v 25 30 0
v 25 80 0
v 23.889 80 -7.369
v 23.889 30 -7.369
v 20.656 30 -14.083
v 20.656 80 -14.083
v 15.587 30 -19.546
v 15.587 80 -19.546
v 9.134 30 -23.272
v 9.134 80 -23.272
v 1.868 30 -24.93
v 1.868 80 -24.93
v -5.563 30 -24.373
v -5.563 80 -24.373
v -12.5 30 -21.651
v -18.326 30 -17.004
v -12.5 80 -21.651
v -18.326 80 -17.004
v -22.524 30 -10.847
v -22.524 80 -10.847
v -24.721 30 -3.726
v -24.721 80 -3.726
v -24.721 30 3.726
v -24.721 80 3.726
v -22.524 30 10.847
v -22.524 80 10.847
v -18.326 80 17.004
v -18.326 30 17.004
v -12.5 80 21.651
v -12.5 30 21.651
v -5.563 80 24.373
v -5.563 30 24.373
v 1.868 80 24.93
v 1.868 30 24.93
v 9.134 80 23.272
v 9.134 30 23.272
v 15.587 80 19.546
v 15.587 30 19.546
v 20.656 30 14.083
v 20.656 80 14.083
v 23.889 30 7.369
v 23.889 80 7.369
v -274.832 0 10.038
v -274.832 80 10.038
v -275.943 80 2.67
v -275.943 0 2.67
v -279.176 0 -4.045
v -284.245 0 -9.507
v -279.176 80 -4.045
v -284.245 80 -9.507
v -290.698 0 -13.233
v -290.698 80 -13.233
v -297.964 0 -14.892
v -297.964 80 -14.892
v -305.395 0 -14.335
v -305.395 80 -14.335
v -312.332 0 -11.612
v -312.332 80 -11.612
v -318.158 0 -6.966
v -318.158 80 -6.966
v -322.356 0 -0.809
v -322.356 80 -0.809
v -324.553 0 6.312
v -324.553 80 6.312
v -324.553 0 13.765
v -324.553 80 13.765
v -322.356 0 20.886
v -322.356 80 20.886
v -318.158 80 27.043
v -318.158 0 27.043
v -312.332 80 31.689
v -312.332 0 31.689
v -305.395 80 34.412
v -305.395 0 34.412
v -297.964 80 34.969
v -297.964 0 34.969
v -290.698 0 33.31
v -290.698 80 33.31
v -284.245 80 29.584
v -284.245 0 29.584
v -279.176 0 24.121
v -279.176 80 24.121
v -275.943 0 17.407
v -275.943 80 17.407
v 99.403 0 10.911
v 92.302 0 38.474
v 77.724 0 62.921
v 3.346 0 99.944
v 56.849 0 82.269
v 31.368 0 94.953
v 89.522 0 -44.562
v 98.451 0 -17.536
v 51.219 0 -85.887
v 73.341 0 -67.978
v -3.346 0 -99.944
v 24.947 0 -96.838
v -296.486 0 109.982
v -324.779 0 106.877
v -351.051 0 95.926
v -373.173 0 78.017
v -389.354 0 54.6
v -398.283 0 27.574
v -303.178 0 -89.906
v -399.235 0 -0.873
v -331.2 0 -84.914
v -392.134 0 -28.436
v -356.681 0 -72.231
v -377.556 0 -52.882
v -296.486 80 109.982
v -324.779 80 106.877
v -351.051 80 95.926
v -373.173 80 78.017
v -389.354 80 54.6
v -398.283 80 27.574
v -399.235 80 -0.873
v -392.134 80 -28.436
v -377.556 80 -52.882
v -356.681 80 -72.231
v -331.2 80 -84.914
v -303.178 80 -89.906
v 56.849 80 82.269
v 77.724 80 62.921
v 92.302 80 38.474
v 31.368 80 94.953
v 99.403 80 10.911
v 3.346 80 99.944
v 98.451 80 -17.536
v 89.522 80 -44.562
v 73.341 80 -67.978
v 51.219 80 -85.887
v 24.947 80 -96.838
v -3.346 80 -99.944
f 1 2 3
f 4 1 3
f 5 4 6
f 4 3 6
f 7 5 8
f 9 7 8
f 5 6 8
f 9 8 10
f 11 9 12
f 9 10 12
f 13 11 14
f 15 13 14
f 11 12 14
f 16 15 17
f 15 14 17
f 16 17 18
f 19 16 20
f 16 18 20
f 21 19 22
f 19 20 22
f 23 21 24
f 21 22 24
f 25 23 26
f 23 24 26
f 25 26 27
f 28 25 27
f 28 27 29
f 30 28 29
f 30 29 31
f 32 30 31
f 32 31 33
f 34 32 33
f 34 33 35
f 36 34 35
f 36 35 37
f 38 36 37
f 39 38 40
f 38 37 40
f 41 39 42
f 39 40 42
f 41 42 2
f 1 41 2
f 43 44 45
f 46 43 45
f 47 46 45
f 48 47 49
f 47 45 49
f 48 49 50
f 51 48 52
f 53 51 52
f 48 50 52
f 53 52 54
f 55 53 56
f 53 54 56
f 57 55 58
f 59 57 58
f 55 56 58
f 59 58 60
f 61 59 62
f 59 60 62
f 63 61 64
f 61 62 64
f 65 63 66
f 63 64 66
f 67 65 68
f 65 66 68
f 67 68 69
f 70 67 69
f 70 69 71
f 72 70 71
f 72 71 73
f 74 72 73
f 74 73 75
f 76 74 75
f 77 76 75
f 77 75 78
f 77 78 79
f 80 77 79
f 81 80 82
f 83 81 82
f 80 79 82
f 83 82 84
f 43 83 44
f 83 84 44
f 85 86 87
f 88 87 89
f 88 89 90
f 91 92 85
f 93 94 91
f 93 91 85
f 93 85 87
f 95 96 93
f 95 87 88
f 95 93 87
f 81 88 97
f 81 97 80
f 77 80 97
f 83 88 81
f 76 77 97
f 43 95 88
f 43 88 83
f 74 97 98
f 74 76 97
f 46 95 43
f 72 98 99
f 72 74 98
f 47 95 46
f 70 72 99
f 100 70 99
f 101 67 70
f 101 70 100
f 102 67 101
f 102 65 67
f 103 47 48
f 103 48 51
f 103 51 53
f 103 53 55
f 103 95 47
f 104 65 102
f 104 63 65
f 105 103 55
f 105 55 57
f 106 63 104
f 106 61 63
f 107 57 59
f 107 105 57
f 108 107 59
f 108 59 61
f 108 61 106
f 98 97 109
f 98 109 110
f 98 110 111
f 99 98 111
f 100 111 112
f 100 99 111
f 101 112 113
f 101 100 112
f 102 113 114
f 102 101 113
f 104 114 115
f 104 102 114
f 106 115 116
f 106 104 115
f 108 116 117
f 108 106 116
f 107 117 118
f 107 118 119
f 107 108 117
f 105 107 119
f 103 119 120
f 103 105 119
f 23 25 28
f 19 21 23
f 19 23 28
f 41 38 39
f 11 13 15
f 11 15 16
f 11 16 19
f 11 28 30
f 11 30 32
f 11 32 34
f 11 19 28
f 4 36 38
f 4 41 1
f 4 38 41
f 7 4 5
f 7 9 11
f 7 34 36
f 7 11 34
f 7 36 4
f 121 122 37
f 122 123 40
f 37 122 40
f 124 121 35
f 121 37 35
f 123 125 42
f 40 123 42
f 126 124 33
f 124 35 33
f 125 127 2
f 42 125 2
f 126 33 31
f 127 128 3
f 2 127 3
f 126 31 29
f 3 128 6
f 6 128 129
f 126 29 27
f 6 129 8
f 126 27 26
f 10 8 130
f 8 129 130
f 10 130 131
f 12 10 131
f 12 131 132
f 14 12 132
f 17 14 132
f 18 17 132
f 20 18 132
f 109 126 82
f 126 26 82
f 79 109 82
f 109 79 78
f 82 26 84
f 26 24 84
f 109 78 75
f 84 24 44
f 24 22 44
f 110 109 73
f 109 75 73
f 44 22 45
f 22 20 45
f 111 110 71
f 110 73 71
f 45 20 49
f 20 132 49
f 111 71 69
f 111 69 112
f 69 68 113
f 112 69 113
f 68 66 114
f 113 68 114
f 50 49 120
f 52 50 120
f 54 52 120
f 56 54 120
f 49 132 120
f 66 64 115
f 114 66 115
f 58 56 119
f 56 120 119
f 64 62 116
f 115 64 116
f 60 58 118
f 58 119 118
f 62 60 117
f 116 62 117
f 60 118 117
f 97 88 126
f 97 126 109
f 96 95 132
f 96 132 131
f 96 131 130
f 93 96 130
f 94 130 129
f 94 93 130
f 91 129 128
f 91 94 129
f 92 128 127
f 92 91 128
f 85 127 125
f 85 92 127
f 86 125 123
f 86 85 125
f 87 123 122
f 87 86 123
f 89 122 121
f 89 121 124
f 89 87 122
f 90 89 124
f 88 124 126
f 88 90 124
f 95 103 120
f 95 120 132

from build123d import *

# Parameters (mm, degrees)
BOSS_EXTRUDE1_DEPTH = 80
SKETCH2_R           = 25
CUT_EXTRUDE1_DEPTH  = 50
SKETCH3_R           = 25
CUT_EXTRUDE2_DEPTH  = 80


with BuildPart() as part:
    # Sketch1 → Boss-Extrude1 (new body)
    with BuildSketch(Plane(origin=(0, 0, 0), x_dir=(1, 0, 0), z_dir=(0, 1, 0))):
        with BuildLine():
            Line((3.346152766, -99.944000629), (-296.48584912, -109.982458927))
            ThreePointArc((-296.48584912, -109.982458927), (-399.776002515, -13.384611064), (-303.178154652, 89.905542331))
            Line((-303.178154652, 89.905542331), (-3.346152766, 99.944000629))
            ThreePointArc((-3.346152766, 99.944000629), (99.944000629, 3.346152766), (3.346152766, -99.944000629))
        make_face()
    extrude(amount=BOSS_EXTRUDE1_DEPTH)

    # Sketch2 → Cut-Extrude1 (cut)
    with BuildSketch(Plane(origin=(0, 80, 0), x_dir=(1, 0, 0), z_dir=(0, 1, 0))):
        Circle(SKETCH2_R)
    extrude(amount=-CUT_EXTRUDE1_DEPTH, mode=Mode.SUBTRACT)

    # Sketch3 → Cut-Extrude2 (cut)
    with BuildSketch(Plane(origin=(0, 80, 0), x_dir=(1, 0, 0), z_dir=(0, 1, 0))):
        with Locations((-299.832001886, -10.038458298)):
            Circle(SKETCH3_R)
    extrude(amount=-CUT_EXTRUDE2_DEPTH, mode=Mode.SUBTRACT)


solid = part.part
